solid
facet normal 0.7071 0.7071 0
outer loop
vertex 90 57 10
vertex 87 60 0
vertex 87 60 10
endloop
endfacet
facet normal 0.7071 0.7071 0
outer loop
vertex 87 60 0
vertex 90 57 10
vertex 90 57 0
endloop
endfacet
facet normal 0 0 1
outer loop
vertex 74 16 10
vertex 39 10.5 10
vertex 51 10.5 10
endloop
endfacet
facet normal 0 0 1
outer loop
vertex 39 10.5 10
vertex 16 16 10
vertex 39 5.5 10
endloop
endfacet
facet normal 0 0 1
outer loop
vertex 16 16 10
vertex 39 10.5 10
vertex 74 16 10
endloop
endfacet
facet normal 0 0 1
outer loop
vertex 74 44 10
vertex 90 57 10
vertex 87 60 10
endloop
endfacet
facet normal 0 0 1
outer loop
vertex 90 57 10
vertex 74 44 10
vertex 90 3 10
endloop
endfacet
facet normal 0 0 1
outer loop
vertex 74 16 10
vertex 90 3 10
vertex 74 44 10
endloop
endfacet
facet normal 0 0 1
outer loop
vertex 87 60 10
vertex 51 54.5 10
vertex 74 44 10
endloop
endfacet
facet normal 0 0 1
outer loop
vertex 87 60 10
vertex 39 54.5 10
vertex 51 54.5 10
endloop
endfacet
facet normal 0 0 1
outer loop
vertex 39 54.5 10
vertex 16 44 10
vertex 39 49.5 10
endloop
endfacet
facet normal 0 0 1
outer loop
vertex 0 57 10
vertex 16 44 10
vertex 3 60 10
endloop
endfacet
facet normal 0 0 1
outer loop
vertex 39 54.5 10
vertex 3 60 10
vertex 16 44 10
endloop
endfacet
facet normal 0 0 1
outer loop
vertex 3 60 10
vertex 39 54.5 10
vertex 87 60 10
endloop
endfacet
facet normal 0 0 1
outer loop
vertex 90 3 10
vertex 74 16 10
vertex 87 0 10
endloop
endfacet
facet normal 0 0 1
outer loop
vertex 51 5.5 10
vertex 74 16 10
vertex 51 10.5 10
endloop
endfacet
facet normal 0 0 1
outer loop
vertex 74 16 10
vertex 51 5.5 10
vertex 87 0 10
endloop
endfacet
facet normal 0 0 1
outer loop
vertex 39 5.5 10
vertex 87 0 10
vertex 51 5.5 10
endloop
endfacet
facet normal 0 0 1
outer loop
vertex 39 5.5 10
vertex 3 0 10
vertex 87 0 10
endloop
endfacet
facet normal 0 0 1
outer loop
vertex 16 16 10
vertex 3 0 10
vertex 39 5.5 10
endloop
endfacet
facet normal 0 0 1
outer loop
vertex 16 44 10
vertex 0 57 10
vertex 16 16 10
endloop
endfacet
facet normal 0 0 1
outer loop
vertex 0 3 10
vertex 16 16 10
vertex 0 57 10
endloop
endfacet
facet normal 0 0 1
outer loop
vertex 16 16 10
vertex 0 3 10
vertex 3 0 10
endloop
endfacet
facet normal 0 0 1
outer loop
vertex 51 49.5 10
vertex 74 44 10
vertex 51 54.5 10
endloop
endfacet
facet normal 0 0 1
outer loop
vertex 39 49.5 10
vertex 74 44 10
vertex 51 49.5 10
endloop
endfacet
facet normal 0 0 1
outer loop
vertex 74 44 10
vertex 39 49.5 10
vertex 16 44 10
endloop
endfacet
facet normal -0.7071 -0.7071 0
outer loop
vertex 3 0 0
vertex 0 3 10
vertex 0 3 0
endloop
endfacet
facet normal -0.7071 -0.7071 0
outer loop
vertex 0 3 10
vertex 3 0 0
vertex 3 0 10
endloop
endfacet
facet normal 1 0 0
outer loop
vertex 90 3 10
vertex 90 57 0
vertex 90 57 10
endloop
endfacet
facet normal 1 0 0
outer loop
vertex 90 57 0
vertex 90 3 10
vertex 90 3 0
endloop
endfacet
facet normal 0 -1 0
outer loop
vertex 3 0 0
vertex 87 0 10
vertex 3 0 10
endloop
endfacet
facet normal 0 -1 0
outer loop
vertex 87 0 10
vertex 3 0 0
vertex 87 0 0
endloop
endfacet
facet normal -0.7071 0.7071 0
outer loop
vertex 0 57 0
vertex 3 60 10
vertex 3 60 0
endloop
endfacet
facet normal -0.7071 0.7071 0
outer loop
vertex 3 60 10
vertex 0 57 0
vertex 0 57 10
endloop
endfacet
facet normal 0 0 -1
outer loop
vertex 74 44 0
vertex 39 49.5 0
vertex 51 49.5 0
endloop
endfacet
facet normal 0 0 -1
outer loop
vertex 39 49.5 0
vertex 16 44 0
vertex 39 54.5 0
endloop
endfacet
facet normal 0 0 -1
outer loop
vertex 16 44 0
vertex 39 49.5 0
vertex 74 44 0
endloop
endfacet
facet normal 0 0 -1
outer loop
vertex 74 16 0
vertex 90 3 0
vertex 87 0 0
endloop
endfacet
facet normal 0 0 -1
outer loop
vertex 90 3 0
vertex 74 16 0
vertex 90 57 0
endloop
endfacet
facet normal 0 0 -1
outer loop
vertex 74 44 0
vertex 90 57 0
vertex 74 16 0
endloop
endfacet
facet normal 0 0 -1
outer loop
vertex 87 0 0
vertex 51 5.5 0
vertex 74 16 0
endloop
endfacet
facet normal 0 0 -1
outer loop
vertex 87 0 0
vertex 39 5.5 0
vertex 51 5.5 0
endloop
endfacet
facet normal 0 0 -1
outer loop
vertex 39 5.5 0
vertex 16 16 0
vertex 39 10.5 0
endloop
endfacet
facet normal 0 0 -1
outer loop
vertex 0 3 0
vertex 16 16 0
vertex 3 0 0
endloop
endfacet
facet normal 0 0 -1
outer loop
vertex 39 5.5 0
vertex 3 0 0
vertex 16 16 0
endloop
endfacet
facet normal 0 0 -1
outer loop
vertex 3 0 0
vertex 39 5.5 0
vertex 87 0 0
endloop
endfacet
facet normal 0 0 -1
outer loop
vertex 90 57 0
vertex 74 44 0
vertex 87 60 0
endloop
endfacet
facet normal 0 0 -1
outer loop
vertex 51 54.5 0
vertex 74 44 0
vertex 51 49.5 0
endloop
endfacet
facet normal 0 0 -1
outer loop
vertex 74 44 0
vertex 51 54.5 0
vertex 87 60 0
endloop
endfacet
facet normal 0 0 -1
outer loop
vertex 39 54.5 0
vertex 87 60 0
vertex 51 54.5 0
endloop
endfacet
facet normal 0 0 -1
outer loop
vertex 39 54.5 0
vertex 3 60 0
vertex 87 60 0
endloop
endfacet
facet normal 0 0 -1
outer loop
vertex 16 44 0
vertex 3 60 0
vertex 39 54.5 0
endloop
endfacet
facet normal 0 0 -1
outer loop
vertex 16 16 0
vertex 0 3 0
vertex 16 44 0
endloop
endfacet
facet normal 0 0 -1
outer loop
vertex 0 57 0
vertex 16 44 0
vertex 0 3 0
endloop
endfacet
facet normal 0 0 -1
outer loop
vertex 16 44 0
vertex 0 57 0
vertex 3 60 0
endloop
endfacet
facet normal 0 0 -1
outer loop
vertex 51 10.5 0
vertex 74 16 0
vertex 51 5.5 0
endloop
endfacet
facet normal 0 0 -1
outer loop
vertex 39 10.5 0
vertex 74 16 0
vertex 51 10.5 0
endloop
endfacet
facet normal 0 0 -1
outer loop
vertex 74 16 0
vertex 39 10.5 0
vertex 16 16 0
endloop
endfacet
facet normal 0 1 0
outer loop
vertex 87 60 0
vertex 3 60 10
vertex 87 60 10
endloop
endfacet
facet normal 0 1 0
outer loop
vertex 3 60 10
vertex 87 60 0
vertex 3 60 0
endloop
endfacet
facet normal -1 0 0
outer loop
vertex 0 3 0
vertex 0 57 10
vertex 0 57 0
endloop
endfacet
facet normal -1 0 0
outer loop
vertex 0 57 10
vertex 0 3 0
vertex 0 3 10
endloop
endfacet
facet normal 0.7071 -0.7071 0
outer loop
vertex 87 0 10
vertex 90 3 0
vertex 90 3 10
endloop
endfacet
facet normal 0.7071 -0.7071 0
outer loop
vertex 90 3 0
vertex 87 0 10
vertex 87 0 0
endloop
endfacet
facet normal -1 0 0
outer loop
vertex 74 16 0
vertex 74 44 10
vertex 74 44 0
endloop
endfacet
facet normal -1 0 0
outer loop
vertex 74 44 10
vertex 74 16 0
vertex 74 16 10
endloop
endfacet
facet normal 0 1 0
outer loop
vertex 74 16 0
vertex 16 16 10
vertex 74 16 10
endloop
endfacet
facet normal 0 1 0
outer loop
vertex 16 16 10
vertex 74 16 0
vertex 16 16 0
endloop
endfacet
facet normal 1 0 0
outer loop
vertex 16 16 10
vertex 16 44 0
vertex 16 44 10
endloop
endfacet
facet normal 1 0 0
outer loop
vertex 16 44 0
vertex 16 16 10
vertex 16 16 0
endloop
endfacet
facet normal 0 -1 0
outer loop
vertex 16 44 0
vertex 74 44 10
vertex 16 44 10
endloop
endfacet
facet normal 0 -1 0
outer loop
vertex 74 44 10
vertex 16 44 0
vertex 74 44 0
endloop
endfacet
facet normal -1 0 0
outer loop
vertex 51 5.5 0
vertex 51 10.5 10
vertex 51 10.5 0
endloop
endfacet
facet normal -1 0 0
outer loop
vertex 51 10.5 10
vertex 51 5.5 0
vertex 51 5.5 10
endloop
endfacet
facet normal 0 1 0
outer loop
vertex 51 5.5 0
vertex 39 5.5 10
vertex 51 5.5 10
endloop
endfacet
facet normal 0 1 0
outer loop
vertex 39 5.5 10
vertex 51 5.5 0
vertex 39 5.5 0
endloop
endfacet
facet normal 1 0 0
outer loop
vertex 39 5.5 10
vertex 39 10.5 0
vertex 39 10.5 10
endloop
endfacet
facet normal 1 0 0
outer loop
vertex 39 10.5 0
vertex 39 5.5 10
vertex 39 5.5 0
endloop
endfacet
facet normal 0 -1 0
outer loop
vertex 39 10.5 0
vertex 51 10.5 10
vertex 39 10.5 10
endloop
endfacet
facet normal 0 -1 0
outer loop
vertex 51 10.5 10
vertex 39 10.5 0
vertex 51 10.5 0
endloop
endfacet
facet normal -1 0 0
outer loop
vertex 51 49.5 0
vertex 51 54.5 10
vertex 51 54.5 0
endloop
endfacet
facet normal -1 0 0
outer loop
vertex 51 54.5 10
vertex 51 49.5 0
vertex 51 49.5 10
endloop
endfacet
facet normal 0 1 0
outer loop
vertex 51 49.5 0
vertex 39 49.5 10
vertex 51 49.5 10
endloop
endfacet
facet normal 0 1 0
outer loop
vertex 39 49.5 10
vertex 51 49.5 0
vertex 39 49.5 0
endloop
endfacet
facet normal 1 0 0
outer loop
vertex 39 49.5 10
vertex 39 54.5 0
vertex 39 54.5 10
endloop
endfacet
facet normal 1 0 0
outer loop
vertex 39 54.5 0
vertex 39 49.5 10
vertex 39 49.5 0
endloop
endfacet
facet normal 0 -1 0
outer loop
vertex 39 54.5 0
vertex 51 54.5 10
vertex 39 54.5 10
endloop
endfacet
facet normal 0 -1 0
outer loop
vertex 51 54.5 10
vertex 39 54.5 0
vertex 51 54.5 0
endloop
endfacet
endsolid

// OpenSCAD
$fn = 32;

// ----------------------------------------------------------------------
// Frame plate: 90 x 60 frame, 16 mm rails
// ----------------------------------------------------------------------

// --- parameters (mm) ---
plate_l = 90;             // plate length, X
plate_w = 60;             // plate width, Y
plate_t = 10;             // plate thickness, Z (extrusion height)
corner_c = 3;             // corner chamfer
frame_bar = 16;           // frame rail width
slot_l = 12;              // adjustment slot length
slot_w = 5;               // adjustment slot width

win_l = plate_l - 2 * frame_bar;  // window length
win_w = plate_w - 2 * frame_bar;  // window width

profile = [[3, 0], [87, 0], [90, 3], [90, 57], [87, 60], [3, 60], [0, 57], [0, 3]];  // primary outline, 8 points, counter clockwise
void_1 = [[16, 16], [74, 16], [74, 44], [16, 44]];  // the window, 4 points
void_2 = [[39, 5.5], [51, 5.5], [51, 10.5], [39, 10.5]];  // adjustment slot, 4 points
void_3 = [[39, 49.5], [51, 49.5], [51, 54.5], [39, 54.5]];  // adjustment slot, 4 points

// --- the one profile operation ---
difference() {
  linear_extrude(height = plate_t) polygon(points = profile);
  translate([0, 0, -1])
    linear_extrude(height = plate_t + 2) polygon(points = void_1);
  translate([0, 0, -1])
    linear_extrude(height = plate_t + 2) polygon(points = void_2);
  translate([0, 0, -1])
    linear_extrude(height = plate_t + 2) polygon(points = void_3);
}
